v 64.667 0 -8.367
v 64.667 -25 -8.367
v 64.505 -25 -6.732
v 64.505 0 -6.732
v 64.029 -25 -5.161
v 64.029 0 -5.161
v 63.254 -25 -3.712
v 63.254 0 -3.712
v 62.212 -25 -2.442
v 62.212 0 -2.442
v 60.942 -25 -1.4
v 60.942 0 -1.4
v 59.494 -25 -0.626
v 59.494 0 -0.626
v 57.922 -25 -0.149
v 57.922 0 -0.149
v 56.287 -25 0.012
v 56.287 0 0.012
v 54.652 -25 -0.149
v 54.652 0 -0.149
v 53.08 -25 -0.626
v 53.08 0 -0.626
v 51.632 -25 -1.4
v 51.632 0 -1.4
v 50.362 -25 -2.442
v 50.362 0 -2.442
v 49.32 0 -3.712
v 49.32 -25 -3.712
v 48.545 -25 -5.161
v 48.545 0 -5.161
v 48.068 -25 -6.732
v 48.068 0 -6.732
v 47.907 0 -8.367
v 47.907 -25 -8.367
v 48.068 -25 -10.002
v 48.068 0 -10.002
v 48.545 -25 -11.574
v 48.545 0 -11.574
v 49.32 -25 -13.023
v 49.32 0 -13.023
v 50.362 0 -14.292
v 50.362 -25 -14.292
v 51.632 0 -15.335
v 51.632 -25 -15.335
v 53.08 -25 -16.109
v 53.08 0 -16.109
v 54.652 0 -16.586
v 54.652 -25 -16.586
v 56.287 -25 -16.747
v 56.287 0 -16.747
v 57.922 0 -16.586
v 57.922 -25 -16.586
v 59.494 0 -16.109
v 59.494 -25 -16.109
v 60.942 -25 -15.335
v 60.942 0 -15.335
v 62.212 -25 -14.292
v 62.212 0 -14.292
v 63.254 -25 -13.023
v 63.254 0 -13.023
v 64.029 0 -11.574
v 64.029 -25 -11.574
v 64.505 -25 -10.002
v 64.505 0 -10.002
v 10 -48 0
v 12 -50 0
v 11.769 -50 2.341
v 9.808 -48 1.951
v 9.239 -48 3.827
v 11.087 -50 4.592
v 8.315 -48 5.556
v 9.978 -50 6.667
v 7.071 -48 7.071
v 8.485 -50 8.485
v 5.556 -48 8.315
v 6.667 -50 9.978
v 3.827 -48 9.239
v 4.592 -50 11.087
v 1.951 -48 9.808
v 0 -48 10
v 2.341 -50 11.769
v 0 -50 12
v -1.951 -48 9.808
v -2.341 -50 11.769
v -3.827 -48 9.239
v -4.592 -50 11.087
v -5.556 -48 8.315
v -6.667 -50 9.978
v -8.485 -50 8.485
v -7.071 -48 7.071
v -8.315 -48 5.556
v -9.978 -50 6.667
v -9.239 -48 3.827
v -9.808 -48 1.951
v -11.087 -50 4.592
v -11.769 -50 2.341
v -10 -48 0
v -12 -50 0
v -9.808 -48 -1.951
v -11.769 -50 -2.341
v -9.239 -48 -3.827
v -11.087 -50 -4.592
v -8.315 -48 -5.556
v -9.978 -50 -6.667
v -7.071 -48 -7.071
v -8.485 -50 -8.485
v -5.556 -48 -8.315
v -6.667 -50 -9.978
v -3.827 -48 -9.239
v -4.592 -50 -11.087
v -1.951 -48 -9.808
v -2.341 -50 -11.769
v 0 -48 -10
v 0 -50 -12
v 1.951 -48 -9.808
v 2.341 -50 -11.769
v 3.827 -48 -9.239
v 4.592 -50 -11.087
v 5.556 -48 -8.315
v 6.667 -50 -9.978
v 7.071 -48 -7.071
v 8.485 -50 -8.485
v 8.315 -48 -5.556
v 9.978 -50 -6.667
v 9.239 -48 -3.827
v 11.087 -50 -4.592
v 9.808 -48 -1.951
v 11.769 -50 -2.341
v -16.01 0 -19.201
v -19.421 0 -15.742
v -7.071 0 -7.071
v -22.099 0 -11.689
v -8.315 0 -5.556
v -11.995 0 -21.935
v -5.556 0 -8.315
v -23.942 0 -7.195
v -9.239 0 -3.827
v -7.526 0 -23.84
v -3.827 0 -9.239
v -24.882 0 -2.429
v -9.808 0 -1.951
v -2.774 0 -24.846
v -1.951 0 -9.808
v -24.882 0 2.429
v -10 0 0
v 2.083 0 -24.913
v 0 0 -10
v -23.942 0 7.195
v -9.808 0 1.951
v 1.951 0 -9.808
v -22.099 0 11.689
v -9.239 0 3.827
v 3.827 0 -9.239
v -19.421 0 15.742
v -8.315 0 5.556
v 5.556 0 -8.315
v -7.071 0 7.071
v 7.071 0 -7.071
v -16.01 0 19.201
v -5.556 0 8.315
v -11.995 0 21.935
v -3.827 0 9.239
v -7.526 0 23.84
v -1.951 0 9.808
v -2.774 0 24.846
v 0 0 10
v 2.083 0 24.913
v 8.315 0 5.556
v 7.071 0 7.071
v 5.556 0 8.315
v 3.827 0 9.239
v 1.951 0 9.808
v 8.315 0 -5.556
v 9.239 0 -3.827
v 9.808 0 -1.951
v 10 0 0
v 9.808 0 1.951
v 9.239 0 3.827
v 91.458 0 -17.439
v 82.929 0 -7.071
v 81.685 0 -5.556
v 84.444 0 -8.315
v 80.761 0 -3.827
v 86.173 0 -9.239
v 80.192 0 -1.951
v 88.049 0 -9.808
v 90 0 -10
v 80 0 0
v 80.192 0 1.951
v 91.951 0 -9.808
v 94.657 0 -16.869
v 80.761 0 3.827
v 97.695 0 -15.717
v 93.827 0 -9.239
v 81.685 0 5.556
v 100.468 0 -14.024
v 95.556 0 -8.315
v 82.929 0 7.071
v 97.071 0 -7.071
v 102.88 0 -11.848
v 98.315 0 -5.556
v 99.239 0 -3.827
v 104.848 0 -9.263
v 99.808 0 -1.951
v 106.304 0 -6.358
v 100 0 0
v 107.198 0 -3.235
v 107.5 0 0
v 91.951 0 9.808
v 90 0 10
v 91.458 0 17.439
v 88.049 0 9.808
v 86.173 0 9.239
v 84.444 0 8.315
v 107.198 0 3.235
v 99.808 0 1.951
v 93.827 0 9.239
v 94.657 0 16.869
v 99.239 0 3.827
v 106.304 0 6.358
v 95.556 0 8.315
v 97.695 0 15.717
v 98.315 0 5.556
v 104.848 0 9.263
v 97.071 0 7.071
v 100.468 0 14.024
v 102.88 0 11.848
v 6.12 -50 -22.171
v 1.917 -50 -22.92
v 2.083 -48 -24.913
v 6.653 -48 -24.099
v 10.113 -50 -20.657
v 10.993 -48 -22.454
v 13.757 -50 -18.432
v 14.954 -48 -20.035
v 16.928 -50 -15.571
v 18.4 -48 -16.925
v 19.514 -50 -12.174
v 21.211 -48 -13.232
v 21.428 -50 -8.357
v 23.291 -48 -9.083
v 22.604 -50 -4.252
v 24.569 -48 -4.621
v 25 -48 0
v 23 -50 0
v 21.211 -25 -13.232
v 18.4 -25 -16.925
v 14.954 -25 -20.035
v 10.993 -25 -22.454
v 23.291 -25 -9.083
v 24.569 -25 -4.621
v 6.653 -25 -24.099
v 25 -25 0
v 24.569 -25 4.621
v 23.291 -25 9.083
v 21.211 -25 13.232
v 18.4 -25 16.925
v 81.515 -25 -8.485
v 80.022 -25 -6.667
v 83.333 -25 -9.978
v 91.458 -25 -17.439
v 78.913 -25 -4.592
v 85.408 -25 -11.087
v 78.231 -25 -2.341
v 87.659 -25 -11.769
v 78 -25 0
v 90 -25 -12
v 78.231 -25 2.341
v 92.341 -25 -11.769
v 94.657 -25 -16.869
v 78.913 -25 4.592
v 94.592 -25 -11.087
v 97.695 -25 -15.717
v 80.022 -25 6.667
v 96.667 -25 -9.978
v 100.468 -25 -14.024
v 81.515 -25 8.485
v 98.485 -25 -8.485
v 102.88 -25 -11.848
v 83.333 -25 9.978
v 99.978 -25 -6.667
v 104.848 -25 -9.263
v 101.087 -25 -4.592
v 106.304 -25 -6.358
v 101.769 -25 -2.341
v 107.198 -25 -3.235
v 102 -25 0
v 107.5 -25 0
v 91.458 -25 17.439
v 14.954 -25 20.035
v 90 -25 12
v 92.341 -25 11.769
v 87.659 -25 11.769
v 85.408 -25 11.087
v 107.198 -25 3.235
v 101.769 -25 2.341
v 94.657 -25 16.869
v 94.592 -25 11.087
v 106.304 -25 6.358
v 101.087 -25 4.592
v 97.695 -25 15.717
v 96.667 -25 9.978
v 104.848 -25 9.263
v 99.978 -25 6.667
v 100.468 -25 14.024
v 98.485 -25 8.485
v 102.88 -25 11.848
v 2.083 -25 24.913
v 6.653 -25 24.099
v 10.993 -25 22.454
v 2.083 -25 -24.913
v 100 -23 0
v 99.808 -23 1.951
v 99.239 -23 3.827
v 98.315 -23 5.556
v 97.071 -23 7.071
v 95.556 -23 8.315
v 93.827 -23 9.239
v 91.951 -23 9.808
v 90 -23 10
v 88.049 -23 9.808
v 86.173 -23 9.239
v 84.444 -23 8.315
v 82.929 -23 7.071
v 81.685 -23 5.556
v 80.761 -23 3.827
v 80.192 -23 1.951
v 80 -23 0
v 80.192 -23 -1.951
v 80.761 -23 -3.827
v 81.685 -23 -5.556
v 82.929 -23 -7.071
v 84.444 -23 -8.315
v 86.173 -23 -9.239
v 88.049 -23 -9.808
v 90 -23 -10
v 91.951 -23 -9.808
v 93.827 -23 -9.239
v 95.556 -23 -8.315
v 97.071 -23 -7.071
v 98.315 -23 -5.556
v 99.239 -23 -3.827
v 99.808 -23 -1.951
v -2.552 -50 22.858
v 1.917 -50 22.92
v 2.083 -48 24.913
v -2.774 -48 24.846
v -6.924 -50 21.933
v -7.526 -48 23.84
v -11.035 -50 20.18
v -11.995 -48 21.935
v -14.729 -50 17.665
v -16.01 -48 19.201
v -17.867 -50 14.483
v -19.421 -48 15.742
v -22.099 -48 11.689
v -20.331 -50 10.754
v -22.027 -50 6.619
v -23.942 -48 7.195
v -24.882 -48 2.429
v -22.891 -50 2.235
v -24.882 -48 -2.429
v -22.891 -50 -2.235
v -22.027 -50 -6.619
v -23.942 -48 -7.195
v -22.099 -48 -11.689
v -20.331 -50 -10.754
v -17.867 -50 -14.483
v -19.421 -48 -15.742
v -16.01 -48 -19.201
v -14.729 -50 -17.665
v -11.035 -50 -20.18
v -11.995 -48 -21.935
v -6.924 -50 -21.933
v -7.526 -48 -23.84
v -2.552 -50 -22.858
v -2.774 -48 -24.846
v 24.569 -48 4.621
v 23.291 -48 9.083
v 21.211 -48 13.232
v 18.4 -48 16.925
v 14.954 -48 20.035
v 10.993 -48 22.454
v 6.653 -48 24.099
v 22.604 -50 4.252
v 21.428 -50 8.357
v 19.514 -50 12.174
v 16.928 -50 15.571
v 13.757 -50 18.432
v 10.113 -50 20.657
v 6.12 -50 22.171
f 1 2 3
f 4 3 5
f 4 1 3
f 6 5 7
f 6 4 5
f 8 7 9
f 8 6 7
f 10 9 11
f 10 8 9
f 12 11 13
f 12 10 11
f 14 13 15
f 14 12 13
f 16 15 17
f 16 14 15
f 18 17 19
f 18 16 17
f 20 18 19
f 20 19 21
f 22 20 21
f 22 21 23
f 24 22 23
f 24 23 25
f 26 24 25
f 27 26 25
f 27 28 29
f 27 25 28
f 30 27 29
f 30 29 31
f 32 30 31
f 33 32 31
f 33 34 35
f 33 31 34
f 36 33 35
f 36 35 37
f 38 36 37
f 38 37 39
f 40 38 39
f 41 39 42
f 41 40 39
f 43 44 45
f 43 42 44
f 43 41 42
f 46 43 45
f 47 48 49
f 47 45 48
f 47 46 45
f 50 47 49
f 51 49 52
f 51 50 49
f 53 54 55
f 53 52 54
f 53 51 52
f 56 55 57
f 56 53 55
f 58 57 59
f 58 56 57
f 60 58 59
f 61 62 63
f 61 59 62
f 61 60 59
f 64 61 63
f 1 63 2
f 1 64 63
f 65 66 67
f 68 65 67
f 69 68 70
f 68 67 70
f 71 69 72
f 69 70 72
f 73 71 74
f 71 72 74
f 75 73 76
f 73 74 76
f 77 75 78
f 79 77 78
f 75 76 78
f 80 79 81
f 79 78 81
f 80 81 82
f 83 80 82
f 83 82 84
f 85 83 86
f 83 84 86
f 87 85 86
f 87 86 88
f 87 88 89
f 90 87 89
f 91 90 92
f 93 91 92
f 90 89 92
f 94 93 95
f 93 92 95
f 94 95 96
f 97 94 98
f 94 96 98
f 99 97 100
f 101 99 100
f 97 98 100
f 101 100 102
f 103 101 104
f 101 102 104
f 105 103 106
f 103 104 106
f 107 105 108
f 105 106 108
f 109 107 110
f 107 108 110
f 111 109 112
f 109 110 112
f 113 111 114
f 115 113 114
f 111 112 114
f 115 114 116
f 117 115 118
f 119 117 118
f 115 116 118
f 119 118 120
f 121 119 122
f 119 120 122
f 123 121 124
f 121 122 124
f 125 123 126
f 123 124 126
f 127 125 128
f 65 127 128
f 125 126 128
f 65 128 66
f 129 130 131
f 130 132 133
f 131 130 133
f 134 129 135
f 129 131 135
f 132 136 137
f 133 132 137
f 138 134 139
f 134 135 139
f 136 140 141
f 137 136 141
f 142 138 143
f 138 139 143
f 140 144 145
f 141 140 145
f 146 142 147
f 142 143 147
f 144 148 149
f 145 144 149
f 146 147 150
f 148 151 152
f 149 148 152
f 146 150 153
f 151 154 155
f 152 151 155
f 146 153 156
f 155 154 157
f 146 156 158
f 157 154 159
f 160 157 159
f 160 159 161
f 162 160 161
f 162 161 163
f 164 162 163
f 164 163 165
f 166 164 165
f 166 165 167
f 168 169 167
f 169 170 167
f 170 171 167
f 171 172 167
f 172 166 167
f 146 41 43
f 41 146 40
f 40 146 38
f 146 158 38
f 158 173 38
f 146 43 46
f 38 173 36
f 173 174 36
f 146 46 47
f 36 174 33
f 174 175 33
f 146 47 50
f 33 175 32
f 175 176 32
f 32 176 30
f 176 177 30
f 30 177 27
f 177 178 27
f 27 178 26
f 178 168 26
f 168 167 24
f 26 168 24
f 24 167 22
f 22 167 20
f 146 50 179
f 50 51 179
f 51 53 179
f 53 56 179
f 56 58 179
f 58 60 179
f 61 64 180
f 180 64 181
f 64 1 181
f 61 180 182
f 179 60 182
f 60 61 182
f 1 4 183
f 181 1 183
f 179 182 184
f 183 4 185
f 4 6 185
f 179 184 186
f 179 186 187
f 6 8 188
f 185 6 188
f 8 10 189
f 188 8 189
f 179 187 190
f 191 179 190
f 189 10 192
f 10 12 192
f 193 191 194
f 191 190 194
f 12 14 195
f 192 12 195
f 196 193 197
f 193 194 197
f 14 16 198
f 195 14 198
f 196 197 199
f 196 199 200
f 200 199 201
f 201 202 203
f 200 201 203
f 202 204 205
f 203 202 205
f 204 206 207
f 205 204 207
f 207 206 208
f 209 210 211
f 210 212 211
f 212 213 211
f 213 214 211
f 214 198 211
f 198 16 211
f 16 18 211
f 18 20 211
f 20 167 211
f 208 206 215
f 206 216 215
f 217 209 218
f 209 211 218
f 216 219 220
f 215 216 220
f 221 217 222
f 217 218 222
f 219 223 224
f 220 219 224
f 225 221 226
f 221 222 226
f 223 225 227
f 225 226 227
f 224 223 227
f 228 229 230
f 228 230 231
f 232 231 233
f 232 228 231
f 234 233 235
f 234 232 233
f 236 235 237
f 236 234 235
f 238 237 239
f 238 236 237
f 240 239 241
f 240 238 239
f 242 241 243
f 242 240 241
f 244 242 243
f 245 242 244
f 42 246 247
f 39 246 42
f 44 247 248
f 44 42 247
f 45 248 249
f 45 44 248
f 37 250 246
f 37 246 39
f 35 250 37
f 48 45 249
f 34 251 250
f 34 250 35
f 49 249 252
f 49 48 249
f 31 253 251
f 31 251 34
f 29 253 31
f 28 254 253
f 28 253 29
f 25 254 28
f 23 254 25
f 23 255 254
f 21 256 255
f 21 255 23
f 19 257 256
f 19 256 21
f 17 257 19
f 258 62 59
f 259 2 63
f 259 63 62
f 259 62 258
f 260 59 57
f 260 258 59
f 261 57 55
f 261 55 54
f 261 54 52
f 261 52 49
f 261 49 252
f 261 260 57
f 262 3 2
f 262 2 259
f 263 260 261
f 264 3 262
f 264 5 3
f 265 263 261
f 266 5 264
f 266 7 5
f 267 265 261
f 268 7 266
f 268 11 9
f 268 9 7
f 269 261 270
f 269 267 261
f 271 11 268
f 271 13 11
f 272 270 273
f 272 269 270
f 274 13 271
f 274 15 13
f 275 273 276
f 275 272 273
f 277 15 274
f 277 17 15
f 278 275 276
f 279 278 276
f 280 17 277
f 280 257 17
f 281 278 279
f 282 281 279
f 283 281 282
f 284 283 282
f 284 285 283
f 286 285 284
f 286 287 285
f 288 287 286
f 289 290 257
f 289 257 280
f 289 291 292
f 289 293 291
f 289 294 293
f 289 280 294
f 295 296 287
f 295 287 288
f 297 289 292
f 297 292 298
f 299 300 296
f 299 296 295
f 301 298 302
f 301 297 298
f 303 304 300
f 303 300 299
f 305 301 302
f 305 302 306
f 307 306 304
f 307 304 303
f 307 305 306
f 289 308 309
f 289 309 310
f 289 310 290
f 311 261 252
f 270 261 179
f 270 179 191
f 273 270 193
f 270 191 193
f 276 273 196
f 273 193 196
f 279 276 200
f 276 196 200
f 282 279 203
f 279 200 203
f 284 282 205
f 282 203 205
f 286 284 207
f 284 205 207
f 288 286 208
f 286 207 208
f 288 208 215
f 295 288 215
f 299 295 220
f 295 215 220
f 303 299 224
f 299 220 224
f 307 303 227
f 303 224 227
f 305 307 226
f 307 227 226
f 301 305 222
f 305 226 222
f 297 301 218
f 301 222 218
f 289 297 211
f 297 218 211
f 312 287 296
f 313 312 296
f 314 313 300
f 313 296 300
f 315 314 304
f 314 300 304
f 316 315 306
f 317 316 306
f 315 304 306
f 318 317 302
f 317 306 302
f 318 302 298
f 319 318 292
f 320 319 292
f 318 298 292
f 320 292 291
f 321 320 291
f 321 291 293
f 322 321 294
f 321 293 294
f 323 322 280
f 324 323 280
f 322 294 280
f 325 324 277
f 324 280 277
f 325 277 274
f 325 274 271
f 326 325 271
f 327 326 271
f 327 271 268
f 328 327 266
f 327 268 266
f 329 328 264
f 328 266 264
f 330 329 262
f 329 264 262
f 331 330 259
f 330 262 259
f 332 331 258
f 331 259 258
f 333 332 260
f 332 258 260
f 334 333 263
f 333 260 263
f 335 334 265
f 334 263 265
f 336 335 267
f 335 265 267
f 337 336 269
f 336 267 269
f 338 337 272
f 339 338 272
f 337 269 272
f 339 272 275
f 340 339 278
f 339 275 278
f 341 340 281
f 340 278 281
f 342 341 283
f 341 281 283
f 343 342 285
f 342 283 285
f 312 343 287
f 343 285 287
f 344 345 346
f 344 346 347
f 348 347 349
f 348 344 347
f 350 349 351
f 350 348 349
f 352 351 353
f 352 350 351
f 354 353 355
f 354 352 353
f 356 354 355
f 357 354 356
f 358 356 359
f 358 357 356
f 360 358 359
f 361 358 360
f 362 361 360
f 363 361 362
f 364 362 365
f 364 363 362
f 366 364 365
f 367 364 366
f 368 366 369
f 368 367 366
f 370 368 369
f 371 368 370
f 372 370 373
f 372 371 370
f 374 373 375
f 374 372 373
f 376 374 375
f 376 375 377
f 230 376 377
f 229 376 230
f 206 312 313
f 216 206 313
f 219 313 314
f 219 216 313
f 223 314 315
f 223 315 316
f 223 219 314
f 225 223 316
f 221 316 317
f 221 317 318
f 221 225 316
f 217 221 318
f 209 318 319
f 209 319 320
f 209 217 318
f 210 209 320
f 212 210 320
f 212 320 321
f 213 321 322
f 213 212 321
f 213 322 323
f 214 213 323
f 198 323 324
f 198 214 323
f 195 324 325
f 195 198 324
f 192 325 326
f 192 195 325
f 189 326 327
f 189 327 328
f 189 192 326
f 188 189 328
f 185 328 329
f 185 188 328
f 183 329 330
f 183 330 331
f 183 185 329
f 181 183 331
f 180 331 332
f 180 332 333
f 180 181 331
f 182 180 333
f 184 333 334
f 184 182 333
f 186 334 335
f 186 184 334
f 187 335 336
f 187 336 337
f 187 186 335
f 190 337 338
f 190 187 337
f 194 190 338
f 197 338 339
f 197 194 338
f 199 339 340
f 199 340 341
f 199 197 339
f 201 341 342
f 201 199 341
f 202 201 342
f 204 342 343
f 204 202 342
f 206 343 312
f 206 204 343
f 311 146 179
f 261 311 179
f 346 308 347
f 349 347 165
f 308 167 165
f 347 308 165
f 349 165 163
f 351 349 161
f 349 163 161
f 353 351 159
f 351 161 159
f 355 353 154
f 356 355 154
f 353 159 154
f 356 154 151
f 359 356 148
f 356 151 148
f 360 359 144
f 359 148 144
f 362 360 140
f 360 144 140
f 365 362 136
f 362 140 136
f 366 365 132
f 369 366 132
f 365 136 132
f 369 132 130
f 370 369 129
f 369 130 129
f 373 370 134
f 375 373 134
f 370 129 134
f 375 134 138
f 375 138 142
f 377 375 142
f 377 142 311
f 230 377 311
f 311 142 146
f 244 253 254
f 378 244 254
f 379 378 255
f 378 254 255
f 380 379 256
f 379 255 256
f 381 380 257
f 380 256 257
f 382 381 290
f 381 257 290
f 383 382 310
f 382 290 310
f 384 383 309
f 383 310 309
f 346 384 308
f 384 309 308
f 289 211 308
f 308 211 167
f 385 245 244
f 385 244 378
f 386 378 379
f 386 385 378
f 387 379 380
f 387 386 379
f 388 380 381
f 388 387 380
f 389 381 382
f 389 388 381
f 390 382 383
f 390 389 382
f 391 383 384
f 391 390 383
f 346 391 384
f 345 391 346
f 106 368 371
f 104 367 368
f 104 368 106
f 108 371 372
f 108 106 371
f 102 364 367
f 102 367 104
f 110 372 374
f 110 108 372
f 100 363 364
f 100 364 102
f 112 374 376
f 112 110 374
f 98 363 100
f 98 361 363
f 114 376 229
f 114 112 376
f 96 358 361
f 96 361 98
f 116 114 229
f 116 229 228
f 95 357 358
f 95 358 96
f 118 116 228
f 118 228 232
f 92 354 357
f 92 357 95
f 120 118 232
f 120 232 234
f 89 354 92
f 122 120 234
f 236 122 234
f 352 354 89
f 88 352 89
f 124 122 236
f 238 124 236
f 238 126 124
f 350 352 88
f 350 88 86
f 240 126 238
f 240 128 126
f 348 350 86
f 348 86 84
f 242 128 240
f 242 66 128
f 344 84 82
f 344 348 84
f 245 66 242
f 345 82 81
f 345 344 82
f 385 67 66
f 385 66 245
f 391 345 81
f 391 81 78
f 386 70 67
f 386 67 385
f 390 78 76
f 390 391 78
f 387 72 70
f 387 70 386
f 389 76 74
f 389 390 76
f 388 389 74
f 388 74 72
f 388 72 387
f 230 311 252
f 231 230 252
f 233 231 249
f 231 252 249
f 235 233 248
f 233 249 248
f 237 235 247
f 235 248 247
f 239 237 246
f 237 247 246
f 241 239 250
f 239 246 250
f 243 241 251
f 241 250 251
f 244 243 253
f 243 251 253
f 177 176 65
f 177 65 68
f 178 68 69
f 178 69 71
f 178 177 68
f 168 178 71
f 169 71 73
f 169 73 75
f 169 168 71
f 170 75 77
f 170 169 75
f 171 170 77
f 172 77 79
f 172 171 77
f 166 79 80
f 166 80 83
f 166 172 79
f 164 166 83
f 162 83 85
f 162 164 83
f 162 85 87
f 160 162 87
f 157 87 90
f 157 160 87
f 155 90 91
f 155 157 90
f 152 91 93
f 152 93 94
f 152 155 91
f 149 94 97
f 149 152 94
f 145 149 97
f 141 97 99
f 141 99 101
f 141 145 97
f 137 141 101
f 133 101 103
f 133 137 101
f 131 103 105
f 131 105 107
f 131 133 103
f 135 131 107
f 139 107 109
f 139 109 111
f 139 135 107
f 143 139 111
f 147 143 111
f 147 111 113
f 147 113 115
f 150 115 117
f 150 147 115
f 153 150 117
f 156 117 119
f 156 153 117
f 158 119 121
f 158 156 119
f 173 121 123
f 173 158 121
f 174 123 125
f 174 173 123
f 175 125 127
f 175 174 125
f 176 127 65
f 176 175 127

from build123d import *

# Parameters (mm, degrees)
F0_R     = 10
F1_DEPTH = 25
F2_DEPTH = 50
F3_SIZE  = 2
F4_R     = 8.379522
F5_DEPTH = 34.1921


with BuildPart() as f1:
    # F0 (on Front) → F1 (new body)
    with BuildSketch(Plane.XZ):
        with BuildLine():
            ThreePointArc((2.083333, -24.913043), (18.399502, -16.92508), (25, 0))
            ThreePointArc((25, 0), (18.399502, 16.92508), (2.083333, 24.913043))
            ThreePointArc((2.083333, 24.913043), (-25, 0), (2.083333, -24.913043))
        make_face()
        Circle(F0_R, mode=Mode.SUBTRACT)
        with BuildLine():
            ThreePointArc((2.083333, 24.913043), (18.399502, 16.92508), (25, 0))
            ThreePointArc((25, 0), (18.399502, -16.92508), (2.083333, -24.913043))
            Line((2.083333, -24.913043), (91.458333, -17.43913))
            ThreePointArc((91.458333, -17.43913), (72.5, 0), (91.458333, 17.43913))
            Line((91.458333, 17.43913), (2.083333, 24.913043))
        make_face()
        with BuildLine():
            ThreePointArc((107.5, 0), (102.879651, 11.847556), (91.458333, 17.43913))
            ThreePointArc((91.458333, 17.43913), (72.5, 0), (91.458333, -17.43913))
            ThreePointArc((91.458333, -17.43913), (102.879651, -11.847556), (107.5, 0))
        make_face()
        with Locations((90, 0)):
            Circle(F0_R, mode=Mode.SUBTRACT)
    extrude(amount=F1_DEPTH)

    # F0 (on Front) → F2 (join)
    with BuildSketch(Plane.XZ):
        with BuildLine():
            ThreePointArc((2.083333, -24.913043), (18.399502, -16.92508), (25, 0))
            ThreePointArc((25, 0), (18.399502, 16.92508), (2.083333, 24.913043))
            ThreePointArc((2.083333, 24.913043), (-25, 0), (2.083333, -24.913043))
        make_face()
        Circle(F0_R, mode=Mode.SUBTRACT)
    extrude(amount=F2_DEPTH)

    # F3
    f3_edges = [f1.edges().sort_by_distance(p)[0] for p in [
        (-2.083333, -50, 24.913043),
        (-10, -50, 0),
        (80, -25, 0),
    ]]
    chamfer(f3_edges, length=F3_SIZE)

    # F4 (on Front) → F5 (cut)
    with BuildSketch(Plane.XZ):
        with Locations((56.286983, -8.367218)):
            Circle(F4_R)
    extrude(amount=F5_DEPTH, mode=Mode.SUBTRACT)


solid = f1.part
